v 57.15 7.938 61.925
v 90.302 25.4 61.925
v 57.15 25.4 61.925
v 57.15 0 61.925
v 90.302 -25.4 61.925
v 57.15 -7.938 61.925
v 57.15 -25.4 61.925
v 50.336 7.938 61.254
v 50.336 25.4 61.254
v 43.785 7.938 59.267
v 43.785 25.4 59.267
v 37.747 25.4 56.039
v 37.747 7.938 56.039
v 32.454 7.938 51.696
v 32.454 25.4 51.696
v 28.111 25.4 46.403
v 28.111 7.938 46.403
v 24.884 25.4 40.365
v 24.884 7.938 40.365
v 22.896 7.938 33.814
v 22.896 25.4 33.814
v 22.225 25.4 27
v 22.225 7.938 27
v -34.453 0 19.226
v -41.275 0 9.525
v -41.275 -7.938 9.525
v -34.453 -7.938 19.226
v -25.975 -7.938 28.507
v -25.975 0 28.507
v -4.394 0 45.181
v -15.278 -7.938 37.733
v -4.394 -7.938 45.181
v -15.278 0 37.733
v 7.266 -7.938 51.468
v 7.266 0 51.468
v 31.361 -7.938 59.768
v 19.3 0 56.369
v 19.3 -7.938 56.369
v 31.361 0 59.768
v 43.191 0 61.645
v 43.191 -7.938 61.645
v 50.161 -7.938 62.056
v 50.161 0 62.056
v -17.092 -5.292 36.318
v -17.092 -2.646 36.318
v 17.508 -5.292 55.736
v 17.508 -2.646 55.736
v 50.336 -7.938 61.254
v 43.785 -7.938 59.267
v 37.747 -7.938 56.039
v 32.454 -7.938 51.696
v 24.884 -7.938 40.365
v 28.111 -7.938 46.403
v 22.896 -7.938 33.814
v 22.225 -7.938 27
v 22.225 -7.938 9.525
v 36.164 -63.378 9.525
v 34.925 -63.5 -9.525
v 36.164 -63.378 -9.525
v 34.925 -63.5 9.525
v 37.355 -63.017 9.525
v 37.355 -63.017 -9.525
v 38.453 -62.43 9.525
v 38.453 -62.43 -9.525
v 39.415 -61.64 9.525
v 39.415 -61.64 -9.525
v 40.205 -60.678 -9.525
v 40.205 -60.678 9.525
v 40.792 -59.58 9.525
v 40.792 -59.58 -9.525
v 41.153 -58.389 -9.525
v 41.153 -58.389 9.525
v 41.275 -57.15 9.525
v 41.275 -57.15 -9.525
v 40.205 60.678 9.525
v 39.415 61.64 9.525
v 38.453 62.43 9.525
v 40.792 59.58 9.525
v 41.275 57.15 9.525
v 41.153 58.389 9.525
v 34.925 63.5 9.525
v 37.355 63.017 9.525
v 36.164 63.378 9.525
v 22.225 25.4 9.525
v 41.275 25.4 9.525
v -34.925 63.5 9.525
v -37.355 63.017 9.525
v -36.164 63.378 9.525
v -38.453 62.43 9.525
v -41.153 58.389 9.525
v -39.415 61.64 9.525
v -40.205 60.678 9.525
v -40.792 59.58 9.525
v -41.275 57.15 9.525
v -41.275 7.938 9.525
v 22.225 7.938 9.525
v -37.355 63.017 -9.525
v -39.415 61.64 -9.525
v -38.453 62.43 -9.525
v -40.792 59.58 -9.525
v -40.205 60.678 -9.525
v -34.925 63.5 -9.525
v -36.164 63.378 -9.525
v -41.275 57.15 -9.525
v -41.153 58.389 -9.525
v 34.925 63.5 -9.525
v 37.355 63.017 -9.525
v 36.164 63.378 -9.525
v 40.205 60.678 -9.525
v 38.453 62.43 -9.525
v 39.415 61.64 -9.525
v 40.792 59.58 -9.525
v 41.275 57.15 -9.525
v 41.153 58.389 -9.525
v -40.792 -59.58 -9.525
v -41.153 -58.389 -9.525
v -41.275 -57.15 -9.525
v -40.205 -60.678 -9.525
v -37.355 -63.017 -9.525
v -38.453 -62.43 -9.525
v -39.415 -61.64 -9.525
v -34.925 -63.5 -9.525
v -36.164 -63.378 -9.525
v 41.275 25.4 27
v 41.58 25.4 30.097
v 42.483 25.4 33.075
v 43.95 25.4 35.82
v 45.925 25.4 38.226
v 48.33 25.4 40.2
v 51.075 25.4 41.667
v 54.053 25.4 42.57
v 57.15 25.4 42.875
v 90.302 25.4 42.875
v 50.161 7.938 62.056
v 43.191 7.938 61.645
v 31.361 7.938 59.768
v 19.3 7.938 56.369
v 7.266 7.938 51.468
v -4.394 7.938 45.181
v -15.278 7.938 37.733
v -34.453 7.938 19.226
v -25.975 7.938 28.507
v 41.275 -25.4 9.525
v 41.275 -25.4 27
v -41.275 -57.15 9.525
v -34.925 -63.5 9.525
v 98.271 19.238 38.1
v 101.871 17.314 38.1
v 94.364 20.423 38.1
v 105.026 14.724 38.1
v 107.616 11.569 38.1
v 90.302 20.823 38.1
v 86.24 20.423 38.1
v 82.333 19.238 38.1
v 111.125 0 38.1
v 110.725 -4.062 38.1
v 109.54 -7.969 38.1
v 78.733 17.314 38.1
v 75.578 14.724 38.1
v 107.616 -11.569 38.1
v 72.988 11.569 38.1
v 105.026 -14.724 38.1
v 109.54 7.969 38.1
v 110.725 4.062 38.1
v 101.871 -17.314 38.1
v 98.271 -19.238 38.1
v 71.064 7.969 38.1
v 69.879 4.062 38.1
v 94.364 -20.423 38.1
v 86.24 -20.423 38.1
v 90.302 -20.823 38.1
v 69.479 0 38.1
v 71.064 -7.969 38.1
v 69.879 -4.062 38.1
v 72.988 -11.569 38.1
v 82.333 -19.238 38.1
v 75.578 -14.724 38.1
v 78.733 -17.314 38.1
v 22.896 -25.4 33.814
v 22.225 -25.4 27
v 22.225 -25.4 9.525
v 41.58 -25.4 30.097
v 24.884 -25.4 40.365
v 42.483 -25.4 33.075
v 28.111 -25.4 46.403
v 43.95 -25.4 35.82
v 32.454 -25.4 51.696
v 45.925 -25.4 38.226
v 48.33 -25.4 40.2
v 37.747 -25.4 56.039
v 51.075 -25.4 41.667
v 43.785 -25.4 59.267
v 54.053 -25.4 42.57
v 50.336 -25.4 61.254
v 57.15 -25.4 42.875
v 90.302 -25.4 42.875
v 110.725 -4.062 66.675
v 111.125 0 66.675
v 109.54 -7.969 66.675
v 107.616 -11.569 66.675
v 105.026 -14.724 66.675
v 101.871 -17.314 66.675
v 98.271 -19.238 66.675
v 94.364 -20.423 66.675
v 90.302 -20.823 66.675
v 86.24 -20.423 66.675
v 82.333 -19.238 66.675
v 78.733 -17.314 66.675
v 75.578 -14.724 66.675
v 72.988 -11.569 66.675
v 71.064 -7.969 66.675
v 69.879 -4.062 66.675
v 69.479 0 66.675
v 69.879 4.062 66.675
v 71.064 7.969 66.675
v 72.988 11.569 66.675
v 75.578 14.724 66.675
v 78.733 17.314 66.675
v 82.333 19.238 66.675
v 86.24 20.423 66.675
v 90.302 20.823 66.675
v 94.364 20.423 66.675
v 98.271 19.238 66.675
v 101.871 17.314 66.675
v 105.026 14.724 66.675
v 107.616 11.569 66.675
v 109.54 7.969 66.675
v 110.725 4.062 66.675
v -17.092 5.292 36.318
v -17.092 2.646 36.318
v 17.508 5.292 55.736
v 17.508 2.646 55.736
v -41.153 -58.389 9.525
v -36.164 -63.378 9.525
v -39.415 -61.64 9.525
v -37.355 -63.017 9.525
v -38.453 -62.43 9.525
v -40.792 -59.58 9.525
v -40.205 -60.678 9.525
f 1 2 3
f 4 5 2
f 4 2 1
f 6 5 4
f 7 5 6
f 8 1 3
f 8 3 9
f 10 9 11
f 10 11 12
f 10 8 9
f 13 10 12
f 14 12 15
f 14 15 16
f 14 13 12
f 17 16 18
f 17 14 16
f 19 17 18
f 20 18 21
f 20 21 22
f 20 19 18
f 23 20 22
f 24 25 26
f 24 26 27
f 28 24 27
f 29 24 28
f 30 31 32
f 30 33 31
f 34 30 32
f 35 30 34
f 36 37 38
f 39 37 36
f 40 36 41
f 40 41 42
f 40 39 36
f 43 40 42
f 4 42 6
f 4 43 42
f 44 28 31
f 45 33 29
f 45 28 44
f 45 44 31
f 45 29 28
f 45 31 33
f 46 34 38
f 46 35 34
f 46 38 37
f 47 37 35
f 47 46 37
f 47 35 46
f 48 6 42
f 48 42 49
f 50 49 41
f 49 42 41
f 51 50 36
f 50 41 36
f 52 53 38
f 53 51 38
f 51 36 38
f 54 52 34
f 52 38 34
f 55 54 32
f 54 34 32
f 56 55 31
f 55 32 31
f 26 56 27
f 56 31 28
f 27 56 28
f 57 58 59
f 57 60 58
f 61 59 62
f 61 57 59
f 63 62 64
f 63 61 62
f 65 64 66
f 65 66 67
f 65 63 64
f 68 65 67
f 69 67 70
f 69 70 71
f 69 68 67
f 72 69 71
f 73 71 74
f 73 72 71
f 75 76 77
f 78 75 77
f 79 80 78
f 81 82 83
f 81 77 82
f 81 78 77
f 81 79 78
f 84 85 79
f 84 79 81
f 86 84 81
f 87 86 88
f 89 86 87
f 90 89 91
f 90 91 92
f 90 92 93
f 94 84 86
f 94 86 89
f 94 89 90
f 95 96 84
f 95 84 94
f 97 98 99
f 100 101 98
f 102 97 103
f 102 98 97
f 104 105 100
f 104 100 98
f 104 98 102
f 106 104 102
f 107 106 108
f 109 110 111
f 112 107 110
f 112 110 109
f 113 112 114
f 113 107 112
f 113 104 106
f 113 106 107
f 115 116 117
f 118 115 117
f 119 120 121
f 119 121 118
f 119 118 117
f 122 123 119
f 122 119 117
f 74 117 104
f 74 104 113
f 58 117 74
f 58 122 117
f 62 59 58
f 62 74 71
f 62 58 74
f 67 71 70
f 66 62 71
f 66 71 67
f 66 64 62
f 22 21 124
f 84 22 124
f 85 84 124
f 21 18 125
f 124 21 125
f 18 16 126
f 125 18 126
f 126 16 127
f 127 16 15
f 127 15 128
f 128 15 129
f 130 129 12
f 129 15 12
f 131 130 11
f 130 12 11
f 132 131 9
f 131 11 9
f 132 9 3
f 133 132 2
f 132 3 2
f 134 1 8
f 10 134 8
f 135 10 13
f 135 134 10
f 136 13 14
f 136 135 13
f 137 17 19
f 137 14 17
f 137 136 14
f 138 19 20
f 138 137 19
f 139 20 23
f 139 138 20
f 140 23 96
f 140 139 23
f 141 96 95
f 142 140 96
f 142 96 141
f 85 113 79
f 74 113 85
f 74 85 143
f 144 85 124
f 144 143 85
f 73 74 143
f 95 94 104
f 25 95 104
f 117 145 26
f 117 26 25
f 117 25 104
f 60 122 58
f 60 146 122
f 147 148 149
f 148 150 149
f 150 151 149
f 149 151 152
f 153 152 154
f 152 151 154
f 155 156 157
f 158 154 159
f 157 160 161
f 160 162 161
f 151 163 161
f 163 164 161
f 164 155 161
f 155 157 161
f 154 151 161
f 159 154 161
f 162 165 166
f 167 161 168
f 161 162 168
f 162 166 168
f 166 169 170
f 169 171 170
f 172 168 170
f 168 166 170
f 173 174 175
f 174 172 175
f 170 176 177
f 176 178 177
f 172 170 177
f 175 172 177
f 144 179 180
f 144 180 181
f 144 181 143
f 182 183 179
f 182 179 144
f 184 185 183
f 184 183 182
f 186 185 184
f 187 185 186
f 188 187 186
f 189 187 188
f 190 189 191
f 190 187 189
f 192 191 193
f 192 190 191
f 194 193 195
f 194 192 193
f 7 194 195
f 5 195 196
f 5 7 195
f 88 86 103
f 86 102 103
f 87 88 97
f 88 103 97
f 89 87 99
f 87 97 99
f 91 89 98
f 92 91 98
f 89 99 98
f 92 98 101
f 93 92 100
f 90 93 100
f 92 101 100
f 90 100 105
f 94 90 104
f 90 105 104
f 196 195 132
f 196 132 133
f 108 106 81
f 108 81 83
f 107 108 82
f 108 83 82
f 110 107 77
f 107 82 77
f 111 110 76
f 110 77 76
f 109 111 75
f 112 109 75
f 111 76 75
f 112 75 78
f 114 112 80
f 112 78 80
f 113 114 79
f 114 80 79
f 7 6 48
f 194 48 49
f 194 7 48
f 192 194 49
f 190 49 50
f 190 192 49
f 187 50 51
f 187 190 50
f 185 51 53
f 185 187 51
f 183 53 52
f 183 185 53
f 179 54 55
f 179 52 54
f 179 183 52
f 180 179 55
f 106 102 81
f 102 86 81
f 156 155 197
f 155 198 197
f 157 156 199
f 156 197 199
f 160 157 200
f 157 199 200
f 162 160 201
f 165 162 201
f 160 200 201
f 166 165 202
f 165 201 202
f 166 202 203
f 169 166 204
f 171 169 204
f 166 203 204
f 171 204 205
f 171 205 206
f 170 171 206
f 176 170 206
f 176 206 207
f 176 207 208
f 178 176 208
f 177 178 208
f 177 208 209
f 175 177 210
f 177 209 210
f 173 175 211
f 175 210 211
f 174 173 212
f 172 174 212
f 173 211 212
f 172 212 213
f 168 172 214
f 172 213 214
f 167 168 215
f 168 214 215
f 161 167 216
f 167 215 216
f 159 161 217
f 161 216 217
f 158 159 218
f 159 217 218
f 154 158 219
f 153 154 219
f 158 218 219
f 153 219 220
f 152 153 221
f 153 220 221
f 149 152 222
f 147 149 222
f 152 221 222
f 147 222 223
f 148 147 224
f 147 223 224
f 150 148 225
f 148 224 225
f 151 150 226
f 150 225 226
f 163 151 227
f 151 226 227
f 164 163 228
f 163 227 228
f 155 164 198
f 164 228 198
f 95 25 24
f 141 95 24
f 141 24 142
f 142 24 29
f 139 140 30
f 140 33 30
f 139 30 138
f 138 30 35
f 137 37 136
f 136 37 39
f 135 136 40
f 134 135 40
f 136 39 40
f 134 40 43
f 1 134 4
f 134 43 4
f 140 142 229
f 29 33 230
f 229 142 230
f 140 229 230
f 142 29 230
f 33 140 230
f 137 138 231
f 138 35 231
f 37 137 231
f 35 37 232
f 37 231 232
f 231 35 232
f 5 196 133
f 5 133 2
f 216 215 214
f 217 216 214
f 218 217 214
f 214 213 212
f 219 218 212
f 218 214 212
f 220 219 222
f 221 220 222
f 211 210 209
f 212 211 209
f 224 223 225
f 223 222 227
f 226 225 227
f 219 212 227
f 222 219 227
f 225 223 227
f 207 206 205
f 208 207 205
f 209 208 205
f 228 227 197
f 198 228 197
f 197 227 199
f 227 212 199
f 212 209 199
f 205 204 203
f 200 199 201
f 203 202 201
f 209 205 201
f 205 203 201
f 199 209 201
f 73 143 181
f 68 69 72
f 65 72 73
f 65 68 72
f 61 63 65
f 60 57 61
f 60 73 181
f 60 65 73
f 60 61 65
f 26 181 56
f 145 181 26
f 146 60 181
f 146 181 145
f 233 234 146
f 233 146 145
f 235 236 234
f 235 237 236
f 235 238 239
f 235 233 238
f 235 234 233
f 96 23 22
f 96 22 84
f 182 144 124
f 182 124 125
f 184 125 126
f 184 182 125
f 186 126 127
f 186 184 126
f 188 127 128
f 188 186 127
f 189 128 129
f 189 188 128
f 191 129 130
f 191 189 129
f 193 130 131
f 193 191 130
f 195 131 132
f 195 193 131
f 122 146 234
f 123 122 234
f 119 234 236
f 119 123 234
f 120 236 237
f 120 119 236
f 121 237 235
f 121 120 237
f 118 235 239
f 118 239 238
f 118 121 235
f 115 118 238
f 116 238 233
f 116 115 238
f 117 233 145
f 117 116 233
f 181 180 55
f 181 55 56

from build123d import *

# Parameters (mm, degrees)
F1_DEPTH = 63.5
F0_W     = 29.977046
F0_H     = 19.05
F2_DEPTH = 25.4
F3_DEPTH = 7.9375
F4_DEPTH = 25.4
F6_R     = 6.35


with BuildPart() as f1:
    # F0 (on Front) → F1 (new body, symmetric)
    with BuildSketch(Plane.XZ):
        Polygon((-41.275, -9.525), (41.275, -9.525), (41.275, 9.525), (22.225, 9.525), (-41.275, 9.525), align=None)
    extrude(amount=F1_DEPTH, both=True)

    # F0 (on Front) → F2 (join, symmetric)
    with BuildSketch(Plane.XZ):
        with BuildLine():
            Line((22.225, 9.525), (41.275, 9.525))
            Line((41.275, 9.525), (41.275, 27.0002))
            ThreePointArc((41.275, 27.0002), (45.92468, 38.22552), (57.15, 42.8752))
            Line((57.15, 42.8752), (60.325, 42.8752))
            Line((60.325, 42.8752), (60.325, 61.9252))
            Line((60.325, 61.9252), (57.15, 61.9252))
            ThreePointArc((57.15, 61.9252), (32.454296, 51.695904), (22.225, 27.0002))
            Line((22.225, 27.0002), (22.225, 9.525))
        make_face()
        with Locations((75.313523, 52.4002)):
            Rectangle(F0_W, F0_H)
    extrude(amount=F2_DEPTH, both=True)

    # F0 (on Front) → F3 (join, symmetric)
    with BuildSketch(Plane.XZ):
        with BuildLine():
            add(Edge.make_bspline(
                [(-41.275, 9.525), (-24.094082, 38.05327), (16.780648, 64.302877), (57.15, 61.9252)],
                knots=[0, 0, 0, 0, 111.504536, 111.504536, 111.504536, 111.504536], degree=3))
            Line((-41.275, 9.525), (22.225, 9.525))
            Line((22.225, 9.525), (22.225, 27.0002))
            ThreePointArc((22.225, 27.0002), (32.454296, 51.695904), (57.15, 61.9252))
        make_face()
    extrude(amount=F3_DEPTH, both=True)

    # F0 (on Front) → F4 (join, symmetric)
    with BuildSketch(Plane.XZ):
        with Locations((75.313523, 52.4002)):
            Rectangle(F0_W, F0_H)
    extrude(amount=F4_DEPTH, both=True)

    # F6
    f6_edges = [f1.edges().sort_by_distance(p)[0] for p in [
        (41.275, -63.5, 0),
        (-41.275, -63.5, 0),
        (41.275, 63.5, 0),
        (-41.275, 63.5, 0),
    ]]
    fillet(f6_edges, radius=F6_R)


with BuildPart() as f5:
    # F0 (on Front) → F5 (revolve)
    with BuildSketch(Plane.XZ):
        Polygon((90.302046, 66.675), (90.302046, 61.9252), (90.302046, 42.8752), (90.302046, 38.1), (111.125, 38.1), (111.125, 66.675), align=None)
    revolve(axis=Axis((90.302046, 0, 52.3875), (0, 0, -1)))


solid = Compound([f1.part, f5.part])
